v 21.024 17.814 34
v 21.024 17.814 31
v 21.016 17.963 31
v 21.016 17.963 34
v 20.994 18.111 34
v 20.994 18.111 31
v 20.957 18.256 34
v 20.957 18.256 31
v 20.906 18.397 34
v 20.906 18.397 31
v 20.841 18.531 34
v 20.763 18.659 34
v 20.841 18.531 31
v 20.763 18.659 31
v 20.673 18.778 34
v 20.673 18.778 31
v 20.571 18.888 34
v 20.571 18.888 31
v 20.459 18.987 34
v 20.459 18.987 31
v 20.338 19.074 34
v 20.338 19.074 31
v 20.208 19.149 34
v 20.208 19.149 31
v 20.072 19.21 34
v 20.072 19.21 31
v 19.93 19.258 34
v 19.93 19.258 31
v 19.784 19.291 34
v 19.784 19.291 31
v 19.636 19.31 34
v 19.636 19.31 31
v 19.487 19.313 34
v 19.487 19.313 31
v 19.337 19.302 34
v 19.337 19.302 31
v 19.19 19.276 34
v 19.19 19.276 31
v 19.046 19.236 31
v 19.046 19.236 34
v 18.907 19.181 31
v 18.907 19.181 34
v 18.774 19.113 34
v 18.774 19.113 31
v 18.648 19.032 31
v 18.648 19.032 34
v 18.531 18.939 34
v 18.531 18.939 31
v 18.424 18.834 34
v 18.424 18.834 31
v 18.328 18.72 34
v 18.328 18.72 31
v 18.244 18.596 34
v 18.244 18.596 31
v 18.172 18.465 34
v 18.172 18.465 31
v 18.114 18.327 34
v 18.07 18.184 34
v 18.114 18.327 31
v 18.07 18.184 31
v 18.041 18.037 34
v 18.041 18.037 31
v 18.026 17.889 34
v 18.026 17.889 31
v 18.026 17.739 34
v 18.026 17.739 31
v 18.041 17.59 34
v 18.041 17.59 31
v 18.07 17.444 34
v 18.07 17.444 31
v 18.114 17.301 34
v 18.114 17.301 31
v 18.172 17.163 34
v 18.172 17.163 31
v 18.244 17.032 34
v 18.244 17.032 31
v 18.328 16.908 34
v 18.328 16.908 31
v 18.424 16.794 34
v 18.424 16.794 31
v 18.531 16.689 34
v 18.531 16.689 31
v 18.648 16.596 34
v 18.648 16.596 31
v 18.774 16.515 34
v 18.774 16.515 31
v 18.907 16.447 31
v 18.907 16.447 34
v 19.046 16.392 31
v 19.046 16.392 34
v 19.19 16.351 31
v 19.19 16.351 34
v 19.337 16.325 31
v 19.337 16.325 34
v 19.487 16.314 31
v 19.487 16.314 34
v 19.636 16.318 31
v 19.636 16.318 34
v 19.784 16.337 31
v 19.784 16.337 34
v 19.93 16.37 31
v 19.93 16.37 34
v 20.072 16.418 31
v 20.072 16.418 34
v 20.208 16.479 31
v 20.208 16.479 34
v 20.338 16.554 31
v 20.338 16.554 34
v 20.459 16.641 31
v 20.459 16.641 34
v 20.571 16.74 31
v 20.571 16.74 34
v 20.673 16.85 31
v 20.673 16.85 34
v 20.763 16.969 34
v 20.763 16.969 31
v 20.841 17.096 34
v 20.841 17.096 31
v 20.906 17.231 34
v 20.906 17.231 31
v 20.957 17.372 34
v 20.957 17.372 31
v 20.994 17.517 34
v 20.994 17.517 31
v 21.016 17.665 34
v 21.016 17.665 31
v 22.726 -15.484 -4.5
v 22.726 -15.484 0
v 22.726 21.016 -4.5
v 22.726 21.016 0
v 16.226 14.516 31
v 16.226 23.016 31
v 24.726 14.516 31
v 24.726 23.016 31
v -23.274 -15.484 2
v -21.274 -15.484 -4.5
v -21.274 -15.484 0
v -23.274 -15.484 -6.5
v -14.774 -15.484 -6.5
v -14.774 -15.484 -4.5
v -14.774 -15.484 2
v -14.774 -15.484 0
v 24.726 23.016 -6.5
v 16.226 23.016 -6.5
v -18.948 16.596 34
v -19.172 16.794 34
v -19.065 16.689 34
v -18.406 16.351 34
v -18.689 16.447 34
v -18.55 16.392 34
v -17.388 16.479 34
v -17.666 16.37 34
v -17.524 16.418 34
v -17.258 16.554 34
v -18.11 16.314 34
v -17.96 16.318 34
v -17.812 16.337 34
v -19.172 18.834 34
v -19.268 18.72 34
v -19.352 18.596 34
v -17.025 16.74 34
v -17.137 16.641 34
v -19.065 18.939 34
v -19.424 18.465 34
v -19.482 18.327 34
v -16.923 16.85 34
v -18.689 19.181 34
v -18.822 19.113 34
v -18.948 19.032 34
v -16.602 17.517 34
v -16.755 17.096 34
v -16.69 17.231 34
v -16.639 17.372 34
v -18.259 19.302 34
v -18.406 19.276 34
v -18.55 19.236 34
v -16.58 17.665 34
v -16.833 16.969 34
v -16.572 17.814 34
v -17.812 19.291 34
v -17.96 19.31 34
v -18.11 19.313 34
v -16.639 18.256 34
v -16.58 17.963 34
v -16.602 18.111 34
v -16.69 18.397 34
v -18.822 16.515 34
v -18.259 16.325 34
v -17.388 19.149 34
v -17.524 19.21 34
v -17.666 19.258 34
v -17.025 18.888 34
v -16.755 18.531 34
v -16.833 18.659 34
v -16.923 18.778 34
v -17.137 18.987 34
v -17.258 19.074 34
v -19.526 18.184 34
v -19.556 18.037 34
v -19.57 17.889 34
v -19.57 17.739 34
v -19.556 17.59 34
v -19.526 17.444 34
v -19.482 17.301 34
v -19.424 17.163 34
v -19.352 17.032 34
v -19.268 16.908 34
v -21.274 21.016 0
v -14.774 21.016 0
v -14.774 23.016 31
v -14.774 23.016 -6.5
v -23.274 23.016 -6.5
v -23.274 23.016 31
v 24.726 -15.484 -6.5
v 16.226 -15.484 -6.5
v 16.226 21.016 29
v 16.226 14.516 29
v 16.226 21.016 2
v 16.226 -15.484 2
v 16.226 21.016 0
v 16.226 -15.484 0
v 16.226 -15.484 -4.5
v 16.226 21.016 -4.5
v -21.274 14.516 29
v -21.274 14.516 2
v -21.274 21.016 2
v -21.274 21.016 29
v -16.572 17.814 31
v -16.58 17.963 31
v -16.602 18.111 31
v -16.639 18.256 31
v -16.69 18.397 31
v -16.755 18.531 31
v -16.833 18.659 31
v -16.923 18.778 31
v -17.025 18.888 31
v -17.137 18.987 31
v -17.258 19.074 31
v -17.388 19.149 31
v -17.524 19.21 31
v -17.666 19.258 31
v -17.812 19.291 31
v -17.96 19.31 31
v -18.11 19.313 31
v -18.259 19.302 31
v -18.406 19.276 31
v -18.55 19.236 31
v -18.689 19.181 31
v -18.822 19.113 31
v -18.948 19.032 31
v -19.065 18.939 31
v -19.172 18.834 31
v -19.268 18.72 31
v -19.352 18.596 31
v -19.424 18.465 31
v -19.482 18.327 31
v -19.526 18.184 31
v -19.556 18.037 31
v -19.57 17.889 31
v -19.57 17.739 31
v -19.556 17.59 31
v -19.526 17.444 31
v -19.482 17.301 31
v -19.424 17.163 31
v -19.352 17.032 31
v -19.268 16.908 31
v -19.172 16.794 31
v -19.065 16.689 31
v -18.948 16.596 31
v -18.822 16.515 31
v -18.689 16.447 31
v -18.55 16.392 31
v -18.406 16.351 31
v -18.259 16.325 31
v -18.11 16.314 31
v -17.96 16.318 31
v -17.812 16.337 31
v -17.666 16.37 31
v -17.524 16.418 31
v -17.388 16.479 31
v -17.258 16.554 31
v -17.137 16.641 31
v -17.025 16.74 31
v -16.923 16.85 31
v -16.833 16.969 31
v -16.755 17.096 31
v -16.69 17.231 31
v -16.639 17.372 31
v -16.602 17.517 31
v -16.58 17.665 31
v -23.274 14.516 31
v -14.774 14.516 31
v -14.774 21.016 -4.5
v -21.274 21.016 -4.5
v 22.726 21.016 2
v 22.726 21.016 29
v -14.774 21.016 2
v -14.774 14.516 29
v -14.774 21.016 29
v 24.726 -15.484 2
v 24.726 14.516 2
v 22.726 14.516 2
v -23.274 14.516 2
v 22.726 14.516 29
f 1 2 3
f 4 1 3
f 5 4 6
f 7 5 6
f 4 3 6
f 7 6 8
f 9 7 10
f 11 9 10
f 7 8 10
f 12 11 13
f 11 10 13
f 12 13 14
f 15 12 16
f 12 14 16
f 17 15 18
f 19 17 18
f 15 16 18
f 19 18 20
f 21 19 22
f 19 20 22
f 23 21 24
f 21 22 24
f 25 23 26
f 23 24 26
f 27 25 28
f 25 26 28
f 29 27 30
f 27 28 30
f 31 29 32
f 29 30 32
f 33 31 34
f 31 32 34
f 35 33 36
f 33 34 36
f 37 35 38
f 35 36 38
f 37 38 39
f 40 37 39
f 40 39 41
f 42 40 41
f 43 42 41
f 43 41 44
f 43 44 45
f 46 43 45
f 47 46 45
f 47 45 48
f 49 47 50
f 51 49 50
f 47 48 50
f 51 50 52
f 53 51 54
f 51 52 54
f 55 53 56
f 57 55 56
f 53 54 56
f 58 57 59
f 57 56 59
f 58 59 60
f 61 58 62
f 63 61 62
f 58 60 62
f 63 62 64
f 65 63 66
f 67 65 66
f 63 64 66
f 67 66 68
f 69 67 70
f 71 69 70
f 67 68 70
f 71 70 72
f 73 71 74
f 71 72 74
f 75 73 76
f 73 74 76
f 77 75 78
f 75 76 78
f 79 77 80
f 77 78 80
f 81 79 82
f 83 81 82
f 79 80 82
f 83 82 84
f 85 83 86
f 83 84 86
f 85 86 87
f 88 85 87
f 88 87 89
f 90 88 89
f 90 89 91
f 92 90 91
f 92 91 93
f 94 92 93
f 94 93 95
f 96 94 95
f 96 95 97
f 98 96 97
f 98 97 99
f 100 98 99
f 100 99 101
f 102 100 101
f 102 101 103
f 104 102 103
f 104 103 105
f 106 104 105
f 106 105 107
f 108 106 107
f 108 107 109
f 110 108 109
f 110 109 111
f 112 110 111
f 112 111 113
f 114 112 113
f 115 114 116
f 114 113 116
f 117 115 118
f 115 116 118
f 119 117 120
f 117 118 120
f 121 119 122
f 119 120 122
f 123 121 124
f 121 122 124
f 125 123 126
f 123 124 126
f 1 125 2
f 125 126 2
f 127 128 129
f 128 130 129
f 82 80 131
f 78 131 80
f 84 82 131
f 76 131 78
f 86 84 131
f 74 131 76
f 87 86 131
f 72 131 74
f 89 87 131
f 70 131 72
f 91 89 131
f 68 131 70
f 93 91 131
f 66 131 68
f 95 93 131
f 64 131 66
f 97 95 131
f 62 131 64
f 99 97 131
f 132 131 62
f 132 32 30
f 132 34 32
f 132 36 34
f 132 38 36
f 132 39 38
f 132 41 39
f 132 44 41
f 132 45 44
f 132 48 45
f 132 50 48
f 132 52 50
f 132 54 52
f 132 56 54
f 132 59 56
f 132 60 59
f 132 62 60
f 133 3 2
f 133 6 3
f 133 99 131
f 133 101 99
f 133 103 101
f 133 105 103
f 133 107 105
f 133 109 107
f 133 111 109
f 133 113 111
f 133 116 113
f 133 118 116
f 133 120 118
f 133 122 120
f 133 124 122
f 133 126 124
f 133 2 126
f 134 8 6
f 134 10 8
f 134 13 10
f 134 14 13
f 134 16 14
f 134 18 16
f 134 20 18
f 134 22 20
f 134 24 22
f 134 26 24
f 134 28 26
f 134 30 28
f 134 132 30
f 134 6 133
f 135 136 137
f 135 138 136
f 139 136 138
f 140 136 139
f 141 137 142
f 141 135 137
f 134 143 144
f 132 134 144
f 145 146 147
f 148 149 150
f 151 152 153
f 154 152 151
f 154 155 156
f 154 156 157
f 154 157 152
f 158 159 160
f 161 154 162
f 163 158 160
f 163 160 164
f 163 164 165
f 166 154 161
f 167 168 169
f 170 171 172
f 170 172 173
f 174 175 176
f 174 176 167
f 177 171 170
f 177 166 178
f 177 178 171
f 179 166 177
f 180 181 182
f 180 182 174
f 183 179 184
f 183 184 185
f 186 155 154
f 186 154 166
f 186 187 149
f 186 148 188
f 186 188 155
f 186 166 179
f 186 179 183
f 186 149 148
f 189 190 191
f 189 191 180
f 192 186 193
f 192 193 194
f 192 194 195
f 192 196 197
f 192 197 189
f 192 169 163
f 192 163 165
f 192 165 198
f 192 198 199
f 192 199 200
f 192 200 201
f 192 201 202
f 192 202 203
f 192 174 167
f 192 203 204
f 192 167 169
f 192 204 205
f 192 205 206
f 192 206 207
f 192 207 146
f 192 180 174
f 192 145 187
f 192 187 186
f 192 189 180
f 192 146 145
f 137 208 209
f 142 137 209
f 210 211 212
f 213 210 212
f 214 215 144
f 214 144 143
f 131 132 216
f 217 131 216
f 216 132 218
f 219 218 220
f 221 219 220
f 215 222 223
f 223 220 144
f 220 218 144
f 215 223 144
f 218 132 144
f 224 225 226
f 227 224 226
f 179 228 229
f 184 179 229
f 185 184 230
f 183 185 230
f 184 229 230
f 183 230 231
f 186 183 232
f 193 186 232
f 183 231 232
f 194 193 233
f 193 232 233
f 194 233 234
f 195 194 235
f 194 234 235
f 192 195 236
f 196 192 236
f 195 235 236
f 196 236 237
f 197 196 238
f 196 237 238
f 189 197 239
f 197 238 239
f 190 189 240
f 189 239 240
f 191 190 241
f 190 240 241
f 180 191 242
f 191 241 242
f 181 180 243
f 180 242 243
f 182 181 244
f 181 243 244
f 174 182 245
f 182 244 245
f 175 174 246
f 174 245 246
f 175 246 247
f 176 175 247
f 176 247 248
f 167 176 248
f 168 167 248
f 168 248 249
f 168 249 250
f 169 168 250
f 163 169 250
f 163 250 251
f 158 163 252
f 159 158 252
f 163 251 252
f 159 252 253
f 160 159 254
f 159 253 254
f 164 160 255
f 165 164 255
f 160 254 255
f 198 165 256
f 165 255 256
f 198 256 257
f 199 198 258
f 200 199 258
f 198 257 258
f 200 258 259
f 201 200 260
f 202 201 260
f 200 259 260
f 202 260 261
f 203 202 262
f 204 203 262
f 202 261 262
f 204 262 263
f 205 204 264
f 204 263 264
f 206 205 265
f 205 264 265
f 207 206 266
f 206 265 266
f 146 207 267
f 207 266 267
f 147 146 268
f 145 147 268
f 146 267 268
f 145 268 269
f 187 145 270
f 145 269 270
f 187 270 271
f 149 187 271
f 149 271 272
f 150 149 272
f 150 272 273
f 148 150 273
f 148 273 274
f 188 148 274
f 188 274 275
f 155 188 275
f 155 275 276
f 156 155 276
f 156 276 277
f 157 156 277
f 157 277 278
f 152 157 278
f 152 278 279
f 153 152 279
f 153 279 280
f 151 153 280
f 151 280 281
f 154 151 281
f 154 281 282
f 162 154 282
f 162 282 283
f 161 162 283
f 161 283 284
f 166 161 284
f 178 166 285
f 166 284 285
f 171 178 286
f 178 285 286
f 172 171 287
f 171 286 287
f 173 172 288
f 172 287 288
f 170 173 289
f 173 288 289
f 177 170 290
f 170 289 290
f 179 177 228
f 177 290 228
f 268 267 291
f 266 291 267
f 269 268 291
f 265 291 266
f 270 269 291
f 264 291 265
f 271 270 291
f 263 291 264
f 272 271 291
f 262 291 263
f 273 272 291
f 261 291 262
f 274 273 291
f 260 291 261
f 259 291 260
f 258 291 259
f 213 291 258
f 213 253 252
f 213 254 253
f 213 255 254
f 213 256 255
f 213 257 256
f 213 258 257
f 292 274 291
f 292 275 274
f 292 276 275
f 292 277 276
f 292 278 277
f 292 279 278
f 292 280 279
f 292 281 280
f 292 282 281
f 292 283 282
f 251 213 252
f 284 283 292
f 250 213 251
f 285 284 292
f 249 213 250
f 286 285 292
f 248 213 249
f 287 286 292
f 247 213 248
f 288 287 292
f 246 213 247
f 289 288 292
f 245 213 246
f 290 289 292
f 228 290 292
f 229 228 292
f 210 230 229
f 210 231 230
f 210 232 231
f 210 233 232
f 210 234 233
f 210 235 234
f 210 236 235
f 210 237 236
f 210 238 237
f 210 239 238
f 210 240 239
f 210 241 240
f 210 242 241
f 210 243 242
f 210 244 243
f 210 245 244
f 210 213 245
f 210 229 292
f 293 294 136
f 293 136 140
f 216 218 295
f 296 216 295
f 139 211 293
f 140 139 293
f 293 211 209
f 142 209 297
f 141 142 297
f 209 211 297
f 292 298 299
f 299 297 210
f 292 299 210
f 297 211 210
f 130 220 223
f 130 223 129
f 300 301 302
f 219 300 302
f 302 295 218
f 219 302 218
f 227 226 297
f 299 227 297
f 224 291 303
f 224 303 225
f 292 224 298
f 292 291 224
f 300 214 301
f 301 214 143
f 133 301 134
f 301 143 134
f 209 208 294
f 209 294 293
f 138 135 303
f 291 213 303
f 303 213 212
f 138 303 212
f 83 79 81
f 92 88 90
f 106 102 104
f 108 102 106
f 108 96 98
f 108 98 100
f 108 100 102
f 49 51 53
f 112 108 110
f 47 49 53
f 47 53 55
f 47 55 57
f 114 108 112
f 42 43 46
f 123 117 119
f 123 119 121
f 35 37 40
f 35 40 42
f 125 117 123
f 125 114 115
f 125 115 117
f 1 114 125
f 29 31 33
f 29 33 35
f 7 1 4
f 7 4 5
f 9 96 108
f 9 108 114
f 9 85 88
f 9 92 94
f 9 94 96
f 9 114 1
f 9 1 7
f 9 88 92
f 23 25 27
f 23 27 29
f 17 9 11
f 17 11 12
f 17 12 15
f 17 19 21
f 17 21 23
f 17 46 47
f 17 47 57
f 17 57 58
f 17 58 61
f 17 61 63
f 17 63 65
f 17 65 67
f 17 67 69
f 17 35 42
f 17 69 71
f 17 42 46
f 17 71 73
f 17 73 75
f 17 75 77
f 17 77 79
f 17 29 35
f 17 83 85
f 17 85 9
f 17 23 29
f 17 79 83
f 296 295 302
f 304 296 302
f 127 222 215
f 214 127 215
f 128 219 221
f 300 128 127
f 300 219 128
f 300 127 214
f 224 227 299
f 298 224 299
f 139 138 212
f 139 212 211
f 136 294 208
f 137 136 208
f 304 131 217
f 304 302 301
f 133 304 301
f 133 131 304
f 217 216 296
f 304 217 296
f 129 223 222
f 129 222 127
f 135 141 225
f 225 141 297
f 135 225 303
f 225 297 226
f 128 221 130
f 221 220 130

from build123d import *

# Parameters (mm, degrees)
F1_DEPTH  = 31
F2_W      = 6.5
F2_H      = 6.5
F3_DEPTH  = 2
F4_W      = 6.5
F4_H      = 6.5
F5_DEPTH  = 2
F6_DEPTH  = 6.5
F7_W      = 6.5
F7_H      = 6.5
F8_DEPTH  = 2
F9_W      = 6.5
F9_H      = 6.5
F10_DEPTH = 2
F11_W     = 6.5
F11_H     = 6.5
F12_DEPTH = 2
F13_W     = 6.5
F13_H     = 6.5
F14_DEPTH = 2
F15_R     = 1.5
F16_DEPTH = 3
F17_R     = 1.5
F18_DEPTH = 3
F20_DEPTH = 30
F22_DEPTH = 30


with BuildPart() as f1:
    # F0 (on Top) → F1 (new body)
    with BuildSketch(Plane.XY):
        with BuildLine():
            Line((-14.7741923779, 23.0157557372), (-16.7741923779, 23.0157557372))
            ThreePointArc((-16.7741923779, 23.0157557372), (-21.3703864556, 21.111949815), (-23.2741923779, 16.5157557372))
            Line((-23.2741923779, 16.5157557372), (-23.2741923779, 14.5157557372))
            Line((-23.2741923779, 14.5157557372), (-21.2741923779, 14.5157557372))
            Line((-21.2741923779, 14.5157557372), (-21.2741923779, 16.5157557372))
            Line((-21.2741923779, 16.5157557372), (-21.2741923779, 21.0157557372))
            Line((-21.2741923779, 21.0157557372), (-16.7741923779, 21.0157557372))
            Line((-16.7741923779, 21.0157557372), (-14.7741923779, 21.0157557372))
            Line((-14.7741923779, 21.0157557372), (-14.7741923779, 23.0157557372))
        make_face()
        with BuildLine():
            ThreePointArc((-23.2741923779, 16.5157557372), (-21.3703864556, 21.111949815), (-16.7741923779, 23.0157557372))
            Line((-16.7741923779, 23.0157557372), (-23.2741923779, 23.0157557372))
            Line((-23.2741923779, 23.0157557372), (-23.2741923779, 16.5157557372))
        make_face()
    extrude(amount=F1_DEPTH)

    # F2 (on face) → F3 (join)
    with BuildSketch(Plane(origin=(0, 0, 0), x_dir=(1, 0, 0), z_dir=(0, 0, -1))):
        with Locations((-18.0241923779, -17.7657557372)):
            Rectangle(F2_W, F2_H)
    extrude(amount=-F3_DEPTH)

    # F0 (on Top) → F6 (join)
    with BuildSketch(Plane.XY):
        with BuildLine():
            Line((-14.7741923779, 23.0157557372), (-16.7741923779, 23.0157557372))
            ThreePointArc((-16.7741923779, 23.0157557372), (-21.3703864556, 21.111949815), (-23.2741923779, 16.5157557372))
            Line((-23.2741923779, 16.5157557372), (-23.2741923779, 14.5157557372))
            Line((-23.2741923779, 14.5157557372), (-21.2741923779, 14.5157557372))
            Line((-21.2741923779, 14.5157557372), (-21.2741923779, 16.5157557372))
            Line((-21.2741923779, 16.5157557372), (-21.2741923779, 21.0157557372))
            Line((-21.2741923779, 21.0157557372), (-16.7741923779, 21.0157557372))
            Line((-16.7741923779, 21.0157557372), (-14.7741923779, 21.0157557372))
            Line((-14.7741923779, 21.0157557372), (-14.7741923779, 23.0157557372))
        make_face()
        with BuildLine():
            ThreePointArc((-23.2741923779, 16.5157557372), (-21.3703864556, 21.111949815), (-16.7741923779, 23.0157557372))
            Line((-16.7741923779, 23.0157557372), (-23.2741923779, 23.0157557372))
            Line((-23.2741923779, 23.0157557372), (-23.2741923779, 16.5157557372))
        make_face()
    extrude(amount=-F6_DEPTH)

    # F7 (on face) → F8 (join)
    with BuildSketch(Plane(origin=(0, 0, -6.5), x_dir=(1, 0, 0), z_dir=(0, 0, -1))):
        with Locations((-18.0241923779, -17.7657557372)):
            Rectangle(F7_W, F7_H)
    extrude(amount=-F8_DEPTH)

    # F13 (on face) → F14 (join)
    with BuildSketch(Plane.XY.offset(31)):
        with Locations((-18.0241923779, 17.7657557372)):
            Rectangle(F13_W, F13_H)
    extrude(amount=-F14_DEPTH)

    # F15 (on face) → F16 (join)
    with BuildSketch(Plane.XY.offset(31)):
        with Locations((-18.0722894168, 17.8138527761)):
            Circle(F15_R)
    extrude(amount=F16_DEPTH)

    # F19 (on face) → F20 (join)
    with BuildSketch(Plane.XZ.offset(-14.5157557372)):
        Polygon((-14.7741923779, 0), (-14.7741923779, 2), (-21.2741923779, 2), (-23.2741923779, 2), (-23.2741923779, -6.5), (-14.7741923779, -6.5), (-14.7741923779, -4.5), (-21.2741923779, -4.5), (-21.2741923779, 0), align=None)
    extrude(amount=F20_DEPTH)


with BuildPart() as f1b:
    # F0 (on Top) → F1, piece 2 (new body)
    with BuildSketch(Plane.XY):
        with BuildLine():
            Line((24.7258076221, 14.5157557372), (24.7258076221, 16.5157557372))
            ThreePointArc((24.7258076221, 16.5157557372), (22.8220016998, 21.111949815), (18.2258076221, 23.0157557372))
            Line((18.2258076221, 23.0157557372), (16.2258076221, 23.0157557372))
            Line((16.2258076221, 23.0157557372), (16.2258076221, 21.0157557372))
            Line((16.2258076221, 21.0157557372), (18.2258076221, 21.0157557372))
            Line((18.2258076221, 21.0157557372), (22.7258076221, 21.0157557372))
            Line((22.7258076221, 21.0157557372), (22.7258076221, 16.5157557372))
            Line((22.7258076221, 16.5157557372), (22.7258076221, 14.5157557372))
            Line((22.7258076221, 14.5157557372), (24.7258076221, 14.5157557372))
        make_face()
        with BuildLine():
            ThreePointArc((18.2258076221, 23.0157557372), (22.8220016998, 21.111949815), (24.7258076221, 16.5157557372))
            Line((24.7258076221, 16.5157557372), (24.7258076221, 23.0157557372))
            Line((24.7258076221, 23.0157557372), (18.2258076221, 23.0157557372))
        make_face()
    extrude(amount=F1_DEPTH)

    # F4 (on face) → F5 (join)
    with BuildSketch(Plane(origin=(0, 0, 0), x_dir=(1, 0, 0), z_dir=(0, 0, -1))):
        with Locations((19.4758076221, -17.7657557372)):
            Rectangle(F4_W, F4_H)
    extrude(amount=-F5_DEPTH)

    # F0 (on Top) → F6, piece 2 (join)
    with BuildSketch(Plane.XY):
        with BuildLine():
            Line((24.7258076221, 14.5157557372), (24.7258076221, 16.5157557372))
            ThreePointArc((24.7258076221, 16.5157557372), (22.8220016998, 21.111949815), (18.2258076221, 23.0157557372))
            Line((18.2258076221, 23.0157557372), (16.2258076221, 23.0157557372))
            Line((16.2258076221, 23.0157557372), (16.2258076221, 21.0157557372))
            Line((16.2258076221, 21.0157557372), (18.2258076221, 21.0157557372))
            Line((18.2258076221, 21.0157557372), (22.7258076221, 21.0157557372))
            Line((22.7258076221, 21.0157557372), (22.7258076221, 16.5157557372))
            Line((22.7258076221, 16.5157557372), (22.7258076221, 14.5157557372))
            Line((22.7258076221, 14.5157557372), (24.7258076221, 14.5157557372))
        make_face()
        with BuildLine():
            ThreePointArc((18.2258076221, 23.0157557372), (22.8220016998, 21.111949815), (24.7258076221, 16.5157557372))
            Line((24.7258076221, 16.5157557372), (24.7258076221, 23.0157557372))
            Line((24.7258076221, 23.0157557372), (18.2258076221, 23.0157557372))
        make_face()
    extrude(amount=-F6_DEPTH)

    # F9 (on face) → F10 (join)
    with BuildSketch(Plane(origin=(0, 0, -6.5), x_dir=(1, 0, 0), z_dir=(0, 0, -1))):
        with Locations((19.4758076221, -17.7657557372)):
            Rectangle(F9_W, F9_H)
    extrude(amount=-F10_DEPTH)

    # F11 (on face) → F12 (join)
    with BuildSketch(Plane.XY.offset(31)):
        with Locations((19.4758076221, 17.7657557372)):
            Rectangle(F11_W, F11_H)
    extrude(amount=-F12_DEPTH)

    # F17 (on face) → F18 (join)
    with BuildSketch(Plane.XY.offset(31)):
        with Locations((19.5239046609, 17.8138527761)):
            Circle(F17_R)
    extrude(amount=F18_DEPTH)

    # F21 (on face) → F22 (join)
    with BuildSketch(Plane.XZ.offset(-14.5157557372)):
        Polygon((22.7258076221, 2), (16.2258076221, 2), (16.2258076221, 0), (22.7258076221, 0), (22.7258076221, -4.5), (16.2258076221, -4.5), (16.2258076221, -6.5), (24.7258076221, -6.5), (24.7258076221, 2), align=None)
    extrude(amount=F22_DEPTH)


solid = Compound([f1.part, f1b.part])
